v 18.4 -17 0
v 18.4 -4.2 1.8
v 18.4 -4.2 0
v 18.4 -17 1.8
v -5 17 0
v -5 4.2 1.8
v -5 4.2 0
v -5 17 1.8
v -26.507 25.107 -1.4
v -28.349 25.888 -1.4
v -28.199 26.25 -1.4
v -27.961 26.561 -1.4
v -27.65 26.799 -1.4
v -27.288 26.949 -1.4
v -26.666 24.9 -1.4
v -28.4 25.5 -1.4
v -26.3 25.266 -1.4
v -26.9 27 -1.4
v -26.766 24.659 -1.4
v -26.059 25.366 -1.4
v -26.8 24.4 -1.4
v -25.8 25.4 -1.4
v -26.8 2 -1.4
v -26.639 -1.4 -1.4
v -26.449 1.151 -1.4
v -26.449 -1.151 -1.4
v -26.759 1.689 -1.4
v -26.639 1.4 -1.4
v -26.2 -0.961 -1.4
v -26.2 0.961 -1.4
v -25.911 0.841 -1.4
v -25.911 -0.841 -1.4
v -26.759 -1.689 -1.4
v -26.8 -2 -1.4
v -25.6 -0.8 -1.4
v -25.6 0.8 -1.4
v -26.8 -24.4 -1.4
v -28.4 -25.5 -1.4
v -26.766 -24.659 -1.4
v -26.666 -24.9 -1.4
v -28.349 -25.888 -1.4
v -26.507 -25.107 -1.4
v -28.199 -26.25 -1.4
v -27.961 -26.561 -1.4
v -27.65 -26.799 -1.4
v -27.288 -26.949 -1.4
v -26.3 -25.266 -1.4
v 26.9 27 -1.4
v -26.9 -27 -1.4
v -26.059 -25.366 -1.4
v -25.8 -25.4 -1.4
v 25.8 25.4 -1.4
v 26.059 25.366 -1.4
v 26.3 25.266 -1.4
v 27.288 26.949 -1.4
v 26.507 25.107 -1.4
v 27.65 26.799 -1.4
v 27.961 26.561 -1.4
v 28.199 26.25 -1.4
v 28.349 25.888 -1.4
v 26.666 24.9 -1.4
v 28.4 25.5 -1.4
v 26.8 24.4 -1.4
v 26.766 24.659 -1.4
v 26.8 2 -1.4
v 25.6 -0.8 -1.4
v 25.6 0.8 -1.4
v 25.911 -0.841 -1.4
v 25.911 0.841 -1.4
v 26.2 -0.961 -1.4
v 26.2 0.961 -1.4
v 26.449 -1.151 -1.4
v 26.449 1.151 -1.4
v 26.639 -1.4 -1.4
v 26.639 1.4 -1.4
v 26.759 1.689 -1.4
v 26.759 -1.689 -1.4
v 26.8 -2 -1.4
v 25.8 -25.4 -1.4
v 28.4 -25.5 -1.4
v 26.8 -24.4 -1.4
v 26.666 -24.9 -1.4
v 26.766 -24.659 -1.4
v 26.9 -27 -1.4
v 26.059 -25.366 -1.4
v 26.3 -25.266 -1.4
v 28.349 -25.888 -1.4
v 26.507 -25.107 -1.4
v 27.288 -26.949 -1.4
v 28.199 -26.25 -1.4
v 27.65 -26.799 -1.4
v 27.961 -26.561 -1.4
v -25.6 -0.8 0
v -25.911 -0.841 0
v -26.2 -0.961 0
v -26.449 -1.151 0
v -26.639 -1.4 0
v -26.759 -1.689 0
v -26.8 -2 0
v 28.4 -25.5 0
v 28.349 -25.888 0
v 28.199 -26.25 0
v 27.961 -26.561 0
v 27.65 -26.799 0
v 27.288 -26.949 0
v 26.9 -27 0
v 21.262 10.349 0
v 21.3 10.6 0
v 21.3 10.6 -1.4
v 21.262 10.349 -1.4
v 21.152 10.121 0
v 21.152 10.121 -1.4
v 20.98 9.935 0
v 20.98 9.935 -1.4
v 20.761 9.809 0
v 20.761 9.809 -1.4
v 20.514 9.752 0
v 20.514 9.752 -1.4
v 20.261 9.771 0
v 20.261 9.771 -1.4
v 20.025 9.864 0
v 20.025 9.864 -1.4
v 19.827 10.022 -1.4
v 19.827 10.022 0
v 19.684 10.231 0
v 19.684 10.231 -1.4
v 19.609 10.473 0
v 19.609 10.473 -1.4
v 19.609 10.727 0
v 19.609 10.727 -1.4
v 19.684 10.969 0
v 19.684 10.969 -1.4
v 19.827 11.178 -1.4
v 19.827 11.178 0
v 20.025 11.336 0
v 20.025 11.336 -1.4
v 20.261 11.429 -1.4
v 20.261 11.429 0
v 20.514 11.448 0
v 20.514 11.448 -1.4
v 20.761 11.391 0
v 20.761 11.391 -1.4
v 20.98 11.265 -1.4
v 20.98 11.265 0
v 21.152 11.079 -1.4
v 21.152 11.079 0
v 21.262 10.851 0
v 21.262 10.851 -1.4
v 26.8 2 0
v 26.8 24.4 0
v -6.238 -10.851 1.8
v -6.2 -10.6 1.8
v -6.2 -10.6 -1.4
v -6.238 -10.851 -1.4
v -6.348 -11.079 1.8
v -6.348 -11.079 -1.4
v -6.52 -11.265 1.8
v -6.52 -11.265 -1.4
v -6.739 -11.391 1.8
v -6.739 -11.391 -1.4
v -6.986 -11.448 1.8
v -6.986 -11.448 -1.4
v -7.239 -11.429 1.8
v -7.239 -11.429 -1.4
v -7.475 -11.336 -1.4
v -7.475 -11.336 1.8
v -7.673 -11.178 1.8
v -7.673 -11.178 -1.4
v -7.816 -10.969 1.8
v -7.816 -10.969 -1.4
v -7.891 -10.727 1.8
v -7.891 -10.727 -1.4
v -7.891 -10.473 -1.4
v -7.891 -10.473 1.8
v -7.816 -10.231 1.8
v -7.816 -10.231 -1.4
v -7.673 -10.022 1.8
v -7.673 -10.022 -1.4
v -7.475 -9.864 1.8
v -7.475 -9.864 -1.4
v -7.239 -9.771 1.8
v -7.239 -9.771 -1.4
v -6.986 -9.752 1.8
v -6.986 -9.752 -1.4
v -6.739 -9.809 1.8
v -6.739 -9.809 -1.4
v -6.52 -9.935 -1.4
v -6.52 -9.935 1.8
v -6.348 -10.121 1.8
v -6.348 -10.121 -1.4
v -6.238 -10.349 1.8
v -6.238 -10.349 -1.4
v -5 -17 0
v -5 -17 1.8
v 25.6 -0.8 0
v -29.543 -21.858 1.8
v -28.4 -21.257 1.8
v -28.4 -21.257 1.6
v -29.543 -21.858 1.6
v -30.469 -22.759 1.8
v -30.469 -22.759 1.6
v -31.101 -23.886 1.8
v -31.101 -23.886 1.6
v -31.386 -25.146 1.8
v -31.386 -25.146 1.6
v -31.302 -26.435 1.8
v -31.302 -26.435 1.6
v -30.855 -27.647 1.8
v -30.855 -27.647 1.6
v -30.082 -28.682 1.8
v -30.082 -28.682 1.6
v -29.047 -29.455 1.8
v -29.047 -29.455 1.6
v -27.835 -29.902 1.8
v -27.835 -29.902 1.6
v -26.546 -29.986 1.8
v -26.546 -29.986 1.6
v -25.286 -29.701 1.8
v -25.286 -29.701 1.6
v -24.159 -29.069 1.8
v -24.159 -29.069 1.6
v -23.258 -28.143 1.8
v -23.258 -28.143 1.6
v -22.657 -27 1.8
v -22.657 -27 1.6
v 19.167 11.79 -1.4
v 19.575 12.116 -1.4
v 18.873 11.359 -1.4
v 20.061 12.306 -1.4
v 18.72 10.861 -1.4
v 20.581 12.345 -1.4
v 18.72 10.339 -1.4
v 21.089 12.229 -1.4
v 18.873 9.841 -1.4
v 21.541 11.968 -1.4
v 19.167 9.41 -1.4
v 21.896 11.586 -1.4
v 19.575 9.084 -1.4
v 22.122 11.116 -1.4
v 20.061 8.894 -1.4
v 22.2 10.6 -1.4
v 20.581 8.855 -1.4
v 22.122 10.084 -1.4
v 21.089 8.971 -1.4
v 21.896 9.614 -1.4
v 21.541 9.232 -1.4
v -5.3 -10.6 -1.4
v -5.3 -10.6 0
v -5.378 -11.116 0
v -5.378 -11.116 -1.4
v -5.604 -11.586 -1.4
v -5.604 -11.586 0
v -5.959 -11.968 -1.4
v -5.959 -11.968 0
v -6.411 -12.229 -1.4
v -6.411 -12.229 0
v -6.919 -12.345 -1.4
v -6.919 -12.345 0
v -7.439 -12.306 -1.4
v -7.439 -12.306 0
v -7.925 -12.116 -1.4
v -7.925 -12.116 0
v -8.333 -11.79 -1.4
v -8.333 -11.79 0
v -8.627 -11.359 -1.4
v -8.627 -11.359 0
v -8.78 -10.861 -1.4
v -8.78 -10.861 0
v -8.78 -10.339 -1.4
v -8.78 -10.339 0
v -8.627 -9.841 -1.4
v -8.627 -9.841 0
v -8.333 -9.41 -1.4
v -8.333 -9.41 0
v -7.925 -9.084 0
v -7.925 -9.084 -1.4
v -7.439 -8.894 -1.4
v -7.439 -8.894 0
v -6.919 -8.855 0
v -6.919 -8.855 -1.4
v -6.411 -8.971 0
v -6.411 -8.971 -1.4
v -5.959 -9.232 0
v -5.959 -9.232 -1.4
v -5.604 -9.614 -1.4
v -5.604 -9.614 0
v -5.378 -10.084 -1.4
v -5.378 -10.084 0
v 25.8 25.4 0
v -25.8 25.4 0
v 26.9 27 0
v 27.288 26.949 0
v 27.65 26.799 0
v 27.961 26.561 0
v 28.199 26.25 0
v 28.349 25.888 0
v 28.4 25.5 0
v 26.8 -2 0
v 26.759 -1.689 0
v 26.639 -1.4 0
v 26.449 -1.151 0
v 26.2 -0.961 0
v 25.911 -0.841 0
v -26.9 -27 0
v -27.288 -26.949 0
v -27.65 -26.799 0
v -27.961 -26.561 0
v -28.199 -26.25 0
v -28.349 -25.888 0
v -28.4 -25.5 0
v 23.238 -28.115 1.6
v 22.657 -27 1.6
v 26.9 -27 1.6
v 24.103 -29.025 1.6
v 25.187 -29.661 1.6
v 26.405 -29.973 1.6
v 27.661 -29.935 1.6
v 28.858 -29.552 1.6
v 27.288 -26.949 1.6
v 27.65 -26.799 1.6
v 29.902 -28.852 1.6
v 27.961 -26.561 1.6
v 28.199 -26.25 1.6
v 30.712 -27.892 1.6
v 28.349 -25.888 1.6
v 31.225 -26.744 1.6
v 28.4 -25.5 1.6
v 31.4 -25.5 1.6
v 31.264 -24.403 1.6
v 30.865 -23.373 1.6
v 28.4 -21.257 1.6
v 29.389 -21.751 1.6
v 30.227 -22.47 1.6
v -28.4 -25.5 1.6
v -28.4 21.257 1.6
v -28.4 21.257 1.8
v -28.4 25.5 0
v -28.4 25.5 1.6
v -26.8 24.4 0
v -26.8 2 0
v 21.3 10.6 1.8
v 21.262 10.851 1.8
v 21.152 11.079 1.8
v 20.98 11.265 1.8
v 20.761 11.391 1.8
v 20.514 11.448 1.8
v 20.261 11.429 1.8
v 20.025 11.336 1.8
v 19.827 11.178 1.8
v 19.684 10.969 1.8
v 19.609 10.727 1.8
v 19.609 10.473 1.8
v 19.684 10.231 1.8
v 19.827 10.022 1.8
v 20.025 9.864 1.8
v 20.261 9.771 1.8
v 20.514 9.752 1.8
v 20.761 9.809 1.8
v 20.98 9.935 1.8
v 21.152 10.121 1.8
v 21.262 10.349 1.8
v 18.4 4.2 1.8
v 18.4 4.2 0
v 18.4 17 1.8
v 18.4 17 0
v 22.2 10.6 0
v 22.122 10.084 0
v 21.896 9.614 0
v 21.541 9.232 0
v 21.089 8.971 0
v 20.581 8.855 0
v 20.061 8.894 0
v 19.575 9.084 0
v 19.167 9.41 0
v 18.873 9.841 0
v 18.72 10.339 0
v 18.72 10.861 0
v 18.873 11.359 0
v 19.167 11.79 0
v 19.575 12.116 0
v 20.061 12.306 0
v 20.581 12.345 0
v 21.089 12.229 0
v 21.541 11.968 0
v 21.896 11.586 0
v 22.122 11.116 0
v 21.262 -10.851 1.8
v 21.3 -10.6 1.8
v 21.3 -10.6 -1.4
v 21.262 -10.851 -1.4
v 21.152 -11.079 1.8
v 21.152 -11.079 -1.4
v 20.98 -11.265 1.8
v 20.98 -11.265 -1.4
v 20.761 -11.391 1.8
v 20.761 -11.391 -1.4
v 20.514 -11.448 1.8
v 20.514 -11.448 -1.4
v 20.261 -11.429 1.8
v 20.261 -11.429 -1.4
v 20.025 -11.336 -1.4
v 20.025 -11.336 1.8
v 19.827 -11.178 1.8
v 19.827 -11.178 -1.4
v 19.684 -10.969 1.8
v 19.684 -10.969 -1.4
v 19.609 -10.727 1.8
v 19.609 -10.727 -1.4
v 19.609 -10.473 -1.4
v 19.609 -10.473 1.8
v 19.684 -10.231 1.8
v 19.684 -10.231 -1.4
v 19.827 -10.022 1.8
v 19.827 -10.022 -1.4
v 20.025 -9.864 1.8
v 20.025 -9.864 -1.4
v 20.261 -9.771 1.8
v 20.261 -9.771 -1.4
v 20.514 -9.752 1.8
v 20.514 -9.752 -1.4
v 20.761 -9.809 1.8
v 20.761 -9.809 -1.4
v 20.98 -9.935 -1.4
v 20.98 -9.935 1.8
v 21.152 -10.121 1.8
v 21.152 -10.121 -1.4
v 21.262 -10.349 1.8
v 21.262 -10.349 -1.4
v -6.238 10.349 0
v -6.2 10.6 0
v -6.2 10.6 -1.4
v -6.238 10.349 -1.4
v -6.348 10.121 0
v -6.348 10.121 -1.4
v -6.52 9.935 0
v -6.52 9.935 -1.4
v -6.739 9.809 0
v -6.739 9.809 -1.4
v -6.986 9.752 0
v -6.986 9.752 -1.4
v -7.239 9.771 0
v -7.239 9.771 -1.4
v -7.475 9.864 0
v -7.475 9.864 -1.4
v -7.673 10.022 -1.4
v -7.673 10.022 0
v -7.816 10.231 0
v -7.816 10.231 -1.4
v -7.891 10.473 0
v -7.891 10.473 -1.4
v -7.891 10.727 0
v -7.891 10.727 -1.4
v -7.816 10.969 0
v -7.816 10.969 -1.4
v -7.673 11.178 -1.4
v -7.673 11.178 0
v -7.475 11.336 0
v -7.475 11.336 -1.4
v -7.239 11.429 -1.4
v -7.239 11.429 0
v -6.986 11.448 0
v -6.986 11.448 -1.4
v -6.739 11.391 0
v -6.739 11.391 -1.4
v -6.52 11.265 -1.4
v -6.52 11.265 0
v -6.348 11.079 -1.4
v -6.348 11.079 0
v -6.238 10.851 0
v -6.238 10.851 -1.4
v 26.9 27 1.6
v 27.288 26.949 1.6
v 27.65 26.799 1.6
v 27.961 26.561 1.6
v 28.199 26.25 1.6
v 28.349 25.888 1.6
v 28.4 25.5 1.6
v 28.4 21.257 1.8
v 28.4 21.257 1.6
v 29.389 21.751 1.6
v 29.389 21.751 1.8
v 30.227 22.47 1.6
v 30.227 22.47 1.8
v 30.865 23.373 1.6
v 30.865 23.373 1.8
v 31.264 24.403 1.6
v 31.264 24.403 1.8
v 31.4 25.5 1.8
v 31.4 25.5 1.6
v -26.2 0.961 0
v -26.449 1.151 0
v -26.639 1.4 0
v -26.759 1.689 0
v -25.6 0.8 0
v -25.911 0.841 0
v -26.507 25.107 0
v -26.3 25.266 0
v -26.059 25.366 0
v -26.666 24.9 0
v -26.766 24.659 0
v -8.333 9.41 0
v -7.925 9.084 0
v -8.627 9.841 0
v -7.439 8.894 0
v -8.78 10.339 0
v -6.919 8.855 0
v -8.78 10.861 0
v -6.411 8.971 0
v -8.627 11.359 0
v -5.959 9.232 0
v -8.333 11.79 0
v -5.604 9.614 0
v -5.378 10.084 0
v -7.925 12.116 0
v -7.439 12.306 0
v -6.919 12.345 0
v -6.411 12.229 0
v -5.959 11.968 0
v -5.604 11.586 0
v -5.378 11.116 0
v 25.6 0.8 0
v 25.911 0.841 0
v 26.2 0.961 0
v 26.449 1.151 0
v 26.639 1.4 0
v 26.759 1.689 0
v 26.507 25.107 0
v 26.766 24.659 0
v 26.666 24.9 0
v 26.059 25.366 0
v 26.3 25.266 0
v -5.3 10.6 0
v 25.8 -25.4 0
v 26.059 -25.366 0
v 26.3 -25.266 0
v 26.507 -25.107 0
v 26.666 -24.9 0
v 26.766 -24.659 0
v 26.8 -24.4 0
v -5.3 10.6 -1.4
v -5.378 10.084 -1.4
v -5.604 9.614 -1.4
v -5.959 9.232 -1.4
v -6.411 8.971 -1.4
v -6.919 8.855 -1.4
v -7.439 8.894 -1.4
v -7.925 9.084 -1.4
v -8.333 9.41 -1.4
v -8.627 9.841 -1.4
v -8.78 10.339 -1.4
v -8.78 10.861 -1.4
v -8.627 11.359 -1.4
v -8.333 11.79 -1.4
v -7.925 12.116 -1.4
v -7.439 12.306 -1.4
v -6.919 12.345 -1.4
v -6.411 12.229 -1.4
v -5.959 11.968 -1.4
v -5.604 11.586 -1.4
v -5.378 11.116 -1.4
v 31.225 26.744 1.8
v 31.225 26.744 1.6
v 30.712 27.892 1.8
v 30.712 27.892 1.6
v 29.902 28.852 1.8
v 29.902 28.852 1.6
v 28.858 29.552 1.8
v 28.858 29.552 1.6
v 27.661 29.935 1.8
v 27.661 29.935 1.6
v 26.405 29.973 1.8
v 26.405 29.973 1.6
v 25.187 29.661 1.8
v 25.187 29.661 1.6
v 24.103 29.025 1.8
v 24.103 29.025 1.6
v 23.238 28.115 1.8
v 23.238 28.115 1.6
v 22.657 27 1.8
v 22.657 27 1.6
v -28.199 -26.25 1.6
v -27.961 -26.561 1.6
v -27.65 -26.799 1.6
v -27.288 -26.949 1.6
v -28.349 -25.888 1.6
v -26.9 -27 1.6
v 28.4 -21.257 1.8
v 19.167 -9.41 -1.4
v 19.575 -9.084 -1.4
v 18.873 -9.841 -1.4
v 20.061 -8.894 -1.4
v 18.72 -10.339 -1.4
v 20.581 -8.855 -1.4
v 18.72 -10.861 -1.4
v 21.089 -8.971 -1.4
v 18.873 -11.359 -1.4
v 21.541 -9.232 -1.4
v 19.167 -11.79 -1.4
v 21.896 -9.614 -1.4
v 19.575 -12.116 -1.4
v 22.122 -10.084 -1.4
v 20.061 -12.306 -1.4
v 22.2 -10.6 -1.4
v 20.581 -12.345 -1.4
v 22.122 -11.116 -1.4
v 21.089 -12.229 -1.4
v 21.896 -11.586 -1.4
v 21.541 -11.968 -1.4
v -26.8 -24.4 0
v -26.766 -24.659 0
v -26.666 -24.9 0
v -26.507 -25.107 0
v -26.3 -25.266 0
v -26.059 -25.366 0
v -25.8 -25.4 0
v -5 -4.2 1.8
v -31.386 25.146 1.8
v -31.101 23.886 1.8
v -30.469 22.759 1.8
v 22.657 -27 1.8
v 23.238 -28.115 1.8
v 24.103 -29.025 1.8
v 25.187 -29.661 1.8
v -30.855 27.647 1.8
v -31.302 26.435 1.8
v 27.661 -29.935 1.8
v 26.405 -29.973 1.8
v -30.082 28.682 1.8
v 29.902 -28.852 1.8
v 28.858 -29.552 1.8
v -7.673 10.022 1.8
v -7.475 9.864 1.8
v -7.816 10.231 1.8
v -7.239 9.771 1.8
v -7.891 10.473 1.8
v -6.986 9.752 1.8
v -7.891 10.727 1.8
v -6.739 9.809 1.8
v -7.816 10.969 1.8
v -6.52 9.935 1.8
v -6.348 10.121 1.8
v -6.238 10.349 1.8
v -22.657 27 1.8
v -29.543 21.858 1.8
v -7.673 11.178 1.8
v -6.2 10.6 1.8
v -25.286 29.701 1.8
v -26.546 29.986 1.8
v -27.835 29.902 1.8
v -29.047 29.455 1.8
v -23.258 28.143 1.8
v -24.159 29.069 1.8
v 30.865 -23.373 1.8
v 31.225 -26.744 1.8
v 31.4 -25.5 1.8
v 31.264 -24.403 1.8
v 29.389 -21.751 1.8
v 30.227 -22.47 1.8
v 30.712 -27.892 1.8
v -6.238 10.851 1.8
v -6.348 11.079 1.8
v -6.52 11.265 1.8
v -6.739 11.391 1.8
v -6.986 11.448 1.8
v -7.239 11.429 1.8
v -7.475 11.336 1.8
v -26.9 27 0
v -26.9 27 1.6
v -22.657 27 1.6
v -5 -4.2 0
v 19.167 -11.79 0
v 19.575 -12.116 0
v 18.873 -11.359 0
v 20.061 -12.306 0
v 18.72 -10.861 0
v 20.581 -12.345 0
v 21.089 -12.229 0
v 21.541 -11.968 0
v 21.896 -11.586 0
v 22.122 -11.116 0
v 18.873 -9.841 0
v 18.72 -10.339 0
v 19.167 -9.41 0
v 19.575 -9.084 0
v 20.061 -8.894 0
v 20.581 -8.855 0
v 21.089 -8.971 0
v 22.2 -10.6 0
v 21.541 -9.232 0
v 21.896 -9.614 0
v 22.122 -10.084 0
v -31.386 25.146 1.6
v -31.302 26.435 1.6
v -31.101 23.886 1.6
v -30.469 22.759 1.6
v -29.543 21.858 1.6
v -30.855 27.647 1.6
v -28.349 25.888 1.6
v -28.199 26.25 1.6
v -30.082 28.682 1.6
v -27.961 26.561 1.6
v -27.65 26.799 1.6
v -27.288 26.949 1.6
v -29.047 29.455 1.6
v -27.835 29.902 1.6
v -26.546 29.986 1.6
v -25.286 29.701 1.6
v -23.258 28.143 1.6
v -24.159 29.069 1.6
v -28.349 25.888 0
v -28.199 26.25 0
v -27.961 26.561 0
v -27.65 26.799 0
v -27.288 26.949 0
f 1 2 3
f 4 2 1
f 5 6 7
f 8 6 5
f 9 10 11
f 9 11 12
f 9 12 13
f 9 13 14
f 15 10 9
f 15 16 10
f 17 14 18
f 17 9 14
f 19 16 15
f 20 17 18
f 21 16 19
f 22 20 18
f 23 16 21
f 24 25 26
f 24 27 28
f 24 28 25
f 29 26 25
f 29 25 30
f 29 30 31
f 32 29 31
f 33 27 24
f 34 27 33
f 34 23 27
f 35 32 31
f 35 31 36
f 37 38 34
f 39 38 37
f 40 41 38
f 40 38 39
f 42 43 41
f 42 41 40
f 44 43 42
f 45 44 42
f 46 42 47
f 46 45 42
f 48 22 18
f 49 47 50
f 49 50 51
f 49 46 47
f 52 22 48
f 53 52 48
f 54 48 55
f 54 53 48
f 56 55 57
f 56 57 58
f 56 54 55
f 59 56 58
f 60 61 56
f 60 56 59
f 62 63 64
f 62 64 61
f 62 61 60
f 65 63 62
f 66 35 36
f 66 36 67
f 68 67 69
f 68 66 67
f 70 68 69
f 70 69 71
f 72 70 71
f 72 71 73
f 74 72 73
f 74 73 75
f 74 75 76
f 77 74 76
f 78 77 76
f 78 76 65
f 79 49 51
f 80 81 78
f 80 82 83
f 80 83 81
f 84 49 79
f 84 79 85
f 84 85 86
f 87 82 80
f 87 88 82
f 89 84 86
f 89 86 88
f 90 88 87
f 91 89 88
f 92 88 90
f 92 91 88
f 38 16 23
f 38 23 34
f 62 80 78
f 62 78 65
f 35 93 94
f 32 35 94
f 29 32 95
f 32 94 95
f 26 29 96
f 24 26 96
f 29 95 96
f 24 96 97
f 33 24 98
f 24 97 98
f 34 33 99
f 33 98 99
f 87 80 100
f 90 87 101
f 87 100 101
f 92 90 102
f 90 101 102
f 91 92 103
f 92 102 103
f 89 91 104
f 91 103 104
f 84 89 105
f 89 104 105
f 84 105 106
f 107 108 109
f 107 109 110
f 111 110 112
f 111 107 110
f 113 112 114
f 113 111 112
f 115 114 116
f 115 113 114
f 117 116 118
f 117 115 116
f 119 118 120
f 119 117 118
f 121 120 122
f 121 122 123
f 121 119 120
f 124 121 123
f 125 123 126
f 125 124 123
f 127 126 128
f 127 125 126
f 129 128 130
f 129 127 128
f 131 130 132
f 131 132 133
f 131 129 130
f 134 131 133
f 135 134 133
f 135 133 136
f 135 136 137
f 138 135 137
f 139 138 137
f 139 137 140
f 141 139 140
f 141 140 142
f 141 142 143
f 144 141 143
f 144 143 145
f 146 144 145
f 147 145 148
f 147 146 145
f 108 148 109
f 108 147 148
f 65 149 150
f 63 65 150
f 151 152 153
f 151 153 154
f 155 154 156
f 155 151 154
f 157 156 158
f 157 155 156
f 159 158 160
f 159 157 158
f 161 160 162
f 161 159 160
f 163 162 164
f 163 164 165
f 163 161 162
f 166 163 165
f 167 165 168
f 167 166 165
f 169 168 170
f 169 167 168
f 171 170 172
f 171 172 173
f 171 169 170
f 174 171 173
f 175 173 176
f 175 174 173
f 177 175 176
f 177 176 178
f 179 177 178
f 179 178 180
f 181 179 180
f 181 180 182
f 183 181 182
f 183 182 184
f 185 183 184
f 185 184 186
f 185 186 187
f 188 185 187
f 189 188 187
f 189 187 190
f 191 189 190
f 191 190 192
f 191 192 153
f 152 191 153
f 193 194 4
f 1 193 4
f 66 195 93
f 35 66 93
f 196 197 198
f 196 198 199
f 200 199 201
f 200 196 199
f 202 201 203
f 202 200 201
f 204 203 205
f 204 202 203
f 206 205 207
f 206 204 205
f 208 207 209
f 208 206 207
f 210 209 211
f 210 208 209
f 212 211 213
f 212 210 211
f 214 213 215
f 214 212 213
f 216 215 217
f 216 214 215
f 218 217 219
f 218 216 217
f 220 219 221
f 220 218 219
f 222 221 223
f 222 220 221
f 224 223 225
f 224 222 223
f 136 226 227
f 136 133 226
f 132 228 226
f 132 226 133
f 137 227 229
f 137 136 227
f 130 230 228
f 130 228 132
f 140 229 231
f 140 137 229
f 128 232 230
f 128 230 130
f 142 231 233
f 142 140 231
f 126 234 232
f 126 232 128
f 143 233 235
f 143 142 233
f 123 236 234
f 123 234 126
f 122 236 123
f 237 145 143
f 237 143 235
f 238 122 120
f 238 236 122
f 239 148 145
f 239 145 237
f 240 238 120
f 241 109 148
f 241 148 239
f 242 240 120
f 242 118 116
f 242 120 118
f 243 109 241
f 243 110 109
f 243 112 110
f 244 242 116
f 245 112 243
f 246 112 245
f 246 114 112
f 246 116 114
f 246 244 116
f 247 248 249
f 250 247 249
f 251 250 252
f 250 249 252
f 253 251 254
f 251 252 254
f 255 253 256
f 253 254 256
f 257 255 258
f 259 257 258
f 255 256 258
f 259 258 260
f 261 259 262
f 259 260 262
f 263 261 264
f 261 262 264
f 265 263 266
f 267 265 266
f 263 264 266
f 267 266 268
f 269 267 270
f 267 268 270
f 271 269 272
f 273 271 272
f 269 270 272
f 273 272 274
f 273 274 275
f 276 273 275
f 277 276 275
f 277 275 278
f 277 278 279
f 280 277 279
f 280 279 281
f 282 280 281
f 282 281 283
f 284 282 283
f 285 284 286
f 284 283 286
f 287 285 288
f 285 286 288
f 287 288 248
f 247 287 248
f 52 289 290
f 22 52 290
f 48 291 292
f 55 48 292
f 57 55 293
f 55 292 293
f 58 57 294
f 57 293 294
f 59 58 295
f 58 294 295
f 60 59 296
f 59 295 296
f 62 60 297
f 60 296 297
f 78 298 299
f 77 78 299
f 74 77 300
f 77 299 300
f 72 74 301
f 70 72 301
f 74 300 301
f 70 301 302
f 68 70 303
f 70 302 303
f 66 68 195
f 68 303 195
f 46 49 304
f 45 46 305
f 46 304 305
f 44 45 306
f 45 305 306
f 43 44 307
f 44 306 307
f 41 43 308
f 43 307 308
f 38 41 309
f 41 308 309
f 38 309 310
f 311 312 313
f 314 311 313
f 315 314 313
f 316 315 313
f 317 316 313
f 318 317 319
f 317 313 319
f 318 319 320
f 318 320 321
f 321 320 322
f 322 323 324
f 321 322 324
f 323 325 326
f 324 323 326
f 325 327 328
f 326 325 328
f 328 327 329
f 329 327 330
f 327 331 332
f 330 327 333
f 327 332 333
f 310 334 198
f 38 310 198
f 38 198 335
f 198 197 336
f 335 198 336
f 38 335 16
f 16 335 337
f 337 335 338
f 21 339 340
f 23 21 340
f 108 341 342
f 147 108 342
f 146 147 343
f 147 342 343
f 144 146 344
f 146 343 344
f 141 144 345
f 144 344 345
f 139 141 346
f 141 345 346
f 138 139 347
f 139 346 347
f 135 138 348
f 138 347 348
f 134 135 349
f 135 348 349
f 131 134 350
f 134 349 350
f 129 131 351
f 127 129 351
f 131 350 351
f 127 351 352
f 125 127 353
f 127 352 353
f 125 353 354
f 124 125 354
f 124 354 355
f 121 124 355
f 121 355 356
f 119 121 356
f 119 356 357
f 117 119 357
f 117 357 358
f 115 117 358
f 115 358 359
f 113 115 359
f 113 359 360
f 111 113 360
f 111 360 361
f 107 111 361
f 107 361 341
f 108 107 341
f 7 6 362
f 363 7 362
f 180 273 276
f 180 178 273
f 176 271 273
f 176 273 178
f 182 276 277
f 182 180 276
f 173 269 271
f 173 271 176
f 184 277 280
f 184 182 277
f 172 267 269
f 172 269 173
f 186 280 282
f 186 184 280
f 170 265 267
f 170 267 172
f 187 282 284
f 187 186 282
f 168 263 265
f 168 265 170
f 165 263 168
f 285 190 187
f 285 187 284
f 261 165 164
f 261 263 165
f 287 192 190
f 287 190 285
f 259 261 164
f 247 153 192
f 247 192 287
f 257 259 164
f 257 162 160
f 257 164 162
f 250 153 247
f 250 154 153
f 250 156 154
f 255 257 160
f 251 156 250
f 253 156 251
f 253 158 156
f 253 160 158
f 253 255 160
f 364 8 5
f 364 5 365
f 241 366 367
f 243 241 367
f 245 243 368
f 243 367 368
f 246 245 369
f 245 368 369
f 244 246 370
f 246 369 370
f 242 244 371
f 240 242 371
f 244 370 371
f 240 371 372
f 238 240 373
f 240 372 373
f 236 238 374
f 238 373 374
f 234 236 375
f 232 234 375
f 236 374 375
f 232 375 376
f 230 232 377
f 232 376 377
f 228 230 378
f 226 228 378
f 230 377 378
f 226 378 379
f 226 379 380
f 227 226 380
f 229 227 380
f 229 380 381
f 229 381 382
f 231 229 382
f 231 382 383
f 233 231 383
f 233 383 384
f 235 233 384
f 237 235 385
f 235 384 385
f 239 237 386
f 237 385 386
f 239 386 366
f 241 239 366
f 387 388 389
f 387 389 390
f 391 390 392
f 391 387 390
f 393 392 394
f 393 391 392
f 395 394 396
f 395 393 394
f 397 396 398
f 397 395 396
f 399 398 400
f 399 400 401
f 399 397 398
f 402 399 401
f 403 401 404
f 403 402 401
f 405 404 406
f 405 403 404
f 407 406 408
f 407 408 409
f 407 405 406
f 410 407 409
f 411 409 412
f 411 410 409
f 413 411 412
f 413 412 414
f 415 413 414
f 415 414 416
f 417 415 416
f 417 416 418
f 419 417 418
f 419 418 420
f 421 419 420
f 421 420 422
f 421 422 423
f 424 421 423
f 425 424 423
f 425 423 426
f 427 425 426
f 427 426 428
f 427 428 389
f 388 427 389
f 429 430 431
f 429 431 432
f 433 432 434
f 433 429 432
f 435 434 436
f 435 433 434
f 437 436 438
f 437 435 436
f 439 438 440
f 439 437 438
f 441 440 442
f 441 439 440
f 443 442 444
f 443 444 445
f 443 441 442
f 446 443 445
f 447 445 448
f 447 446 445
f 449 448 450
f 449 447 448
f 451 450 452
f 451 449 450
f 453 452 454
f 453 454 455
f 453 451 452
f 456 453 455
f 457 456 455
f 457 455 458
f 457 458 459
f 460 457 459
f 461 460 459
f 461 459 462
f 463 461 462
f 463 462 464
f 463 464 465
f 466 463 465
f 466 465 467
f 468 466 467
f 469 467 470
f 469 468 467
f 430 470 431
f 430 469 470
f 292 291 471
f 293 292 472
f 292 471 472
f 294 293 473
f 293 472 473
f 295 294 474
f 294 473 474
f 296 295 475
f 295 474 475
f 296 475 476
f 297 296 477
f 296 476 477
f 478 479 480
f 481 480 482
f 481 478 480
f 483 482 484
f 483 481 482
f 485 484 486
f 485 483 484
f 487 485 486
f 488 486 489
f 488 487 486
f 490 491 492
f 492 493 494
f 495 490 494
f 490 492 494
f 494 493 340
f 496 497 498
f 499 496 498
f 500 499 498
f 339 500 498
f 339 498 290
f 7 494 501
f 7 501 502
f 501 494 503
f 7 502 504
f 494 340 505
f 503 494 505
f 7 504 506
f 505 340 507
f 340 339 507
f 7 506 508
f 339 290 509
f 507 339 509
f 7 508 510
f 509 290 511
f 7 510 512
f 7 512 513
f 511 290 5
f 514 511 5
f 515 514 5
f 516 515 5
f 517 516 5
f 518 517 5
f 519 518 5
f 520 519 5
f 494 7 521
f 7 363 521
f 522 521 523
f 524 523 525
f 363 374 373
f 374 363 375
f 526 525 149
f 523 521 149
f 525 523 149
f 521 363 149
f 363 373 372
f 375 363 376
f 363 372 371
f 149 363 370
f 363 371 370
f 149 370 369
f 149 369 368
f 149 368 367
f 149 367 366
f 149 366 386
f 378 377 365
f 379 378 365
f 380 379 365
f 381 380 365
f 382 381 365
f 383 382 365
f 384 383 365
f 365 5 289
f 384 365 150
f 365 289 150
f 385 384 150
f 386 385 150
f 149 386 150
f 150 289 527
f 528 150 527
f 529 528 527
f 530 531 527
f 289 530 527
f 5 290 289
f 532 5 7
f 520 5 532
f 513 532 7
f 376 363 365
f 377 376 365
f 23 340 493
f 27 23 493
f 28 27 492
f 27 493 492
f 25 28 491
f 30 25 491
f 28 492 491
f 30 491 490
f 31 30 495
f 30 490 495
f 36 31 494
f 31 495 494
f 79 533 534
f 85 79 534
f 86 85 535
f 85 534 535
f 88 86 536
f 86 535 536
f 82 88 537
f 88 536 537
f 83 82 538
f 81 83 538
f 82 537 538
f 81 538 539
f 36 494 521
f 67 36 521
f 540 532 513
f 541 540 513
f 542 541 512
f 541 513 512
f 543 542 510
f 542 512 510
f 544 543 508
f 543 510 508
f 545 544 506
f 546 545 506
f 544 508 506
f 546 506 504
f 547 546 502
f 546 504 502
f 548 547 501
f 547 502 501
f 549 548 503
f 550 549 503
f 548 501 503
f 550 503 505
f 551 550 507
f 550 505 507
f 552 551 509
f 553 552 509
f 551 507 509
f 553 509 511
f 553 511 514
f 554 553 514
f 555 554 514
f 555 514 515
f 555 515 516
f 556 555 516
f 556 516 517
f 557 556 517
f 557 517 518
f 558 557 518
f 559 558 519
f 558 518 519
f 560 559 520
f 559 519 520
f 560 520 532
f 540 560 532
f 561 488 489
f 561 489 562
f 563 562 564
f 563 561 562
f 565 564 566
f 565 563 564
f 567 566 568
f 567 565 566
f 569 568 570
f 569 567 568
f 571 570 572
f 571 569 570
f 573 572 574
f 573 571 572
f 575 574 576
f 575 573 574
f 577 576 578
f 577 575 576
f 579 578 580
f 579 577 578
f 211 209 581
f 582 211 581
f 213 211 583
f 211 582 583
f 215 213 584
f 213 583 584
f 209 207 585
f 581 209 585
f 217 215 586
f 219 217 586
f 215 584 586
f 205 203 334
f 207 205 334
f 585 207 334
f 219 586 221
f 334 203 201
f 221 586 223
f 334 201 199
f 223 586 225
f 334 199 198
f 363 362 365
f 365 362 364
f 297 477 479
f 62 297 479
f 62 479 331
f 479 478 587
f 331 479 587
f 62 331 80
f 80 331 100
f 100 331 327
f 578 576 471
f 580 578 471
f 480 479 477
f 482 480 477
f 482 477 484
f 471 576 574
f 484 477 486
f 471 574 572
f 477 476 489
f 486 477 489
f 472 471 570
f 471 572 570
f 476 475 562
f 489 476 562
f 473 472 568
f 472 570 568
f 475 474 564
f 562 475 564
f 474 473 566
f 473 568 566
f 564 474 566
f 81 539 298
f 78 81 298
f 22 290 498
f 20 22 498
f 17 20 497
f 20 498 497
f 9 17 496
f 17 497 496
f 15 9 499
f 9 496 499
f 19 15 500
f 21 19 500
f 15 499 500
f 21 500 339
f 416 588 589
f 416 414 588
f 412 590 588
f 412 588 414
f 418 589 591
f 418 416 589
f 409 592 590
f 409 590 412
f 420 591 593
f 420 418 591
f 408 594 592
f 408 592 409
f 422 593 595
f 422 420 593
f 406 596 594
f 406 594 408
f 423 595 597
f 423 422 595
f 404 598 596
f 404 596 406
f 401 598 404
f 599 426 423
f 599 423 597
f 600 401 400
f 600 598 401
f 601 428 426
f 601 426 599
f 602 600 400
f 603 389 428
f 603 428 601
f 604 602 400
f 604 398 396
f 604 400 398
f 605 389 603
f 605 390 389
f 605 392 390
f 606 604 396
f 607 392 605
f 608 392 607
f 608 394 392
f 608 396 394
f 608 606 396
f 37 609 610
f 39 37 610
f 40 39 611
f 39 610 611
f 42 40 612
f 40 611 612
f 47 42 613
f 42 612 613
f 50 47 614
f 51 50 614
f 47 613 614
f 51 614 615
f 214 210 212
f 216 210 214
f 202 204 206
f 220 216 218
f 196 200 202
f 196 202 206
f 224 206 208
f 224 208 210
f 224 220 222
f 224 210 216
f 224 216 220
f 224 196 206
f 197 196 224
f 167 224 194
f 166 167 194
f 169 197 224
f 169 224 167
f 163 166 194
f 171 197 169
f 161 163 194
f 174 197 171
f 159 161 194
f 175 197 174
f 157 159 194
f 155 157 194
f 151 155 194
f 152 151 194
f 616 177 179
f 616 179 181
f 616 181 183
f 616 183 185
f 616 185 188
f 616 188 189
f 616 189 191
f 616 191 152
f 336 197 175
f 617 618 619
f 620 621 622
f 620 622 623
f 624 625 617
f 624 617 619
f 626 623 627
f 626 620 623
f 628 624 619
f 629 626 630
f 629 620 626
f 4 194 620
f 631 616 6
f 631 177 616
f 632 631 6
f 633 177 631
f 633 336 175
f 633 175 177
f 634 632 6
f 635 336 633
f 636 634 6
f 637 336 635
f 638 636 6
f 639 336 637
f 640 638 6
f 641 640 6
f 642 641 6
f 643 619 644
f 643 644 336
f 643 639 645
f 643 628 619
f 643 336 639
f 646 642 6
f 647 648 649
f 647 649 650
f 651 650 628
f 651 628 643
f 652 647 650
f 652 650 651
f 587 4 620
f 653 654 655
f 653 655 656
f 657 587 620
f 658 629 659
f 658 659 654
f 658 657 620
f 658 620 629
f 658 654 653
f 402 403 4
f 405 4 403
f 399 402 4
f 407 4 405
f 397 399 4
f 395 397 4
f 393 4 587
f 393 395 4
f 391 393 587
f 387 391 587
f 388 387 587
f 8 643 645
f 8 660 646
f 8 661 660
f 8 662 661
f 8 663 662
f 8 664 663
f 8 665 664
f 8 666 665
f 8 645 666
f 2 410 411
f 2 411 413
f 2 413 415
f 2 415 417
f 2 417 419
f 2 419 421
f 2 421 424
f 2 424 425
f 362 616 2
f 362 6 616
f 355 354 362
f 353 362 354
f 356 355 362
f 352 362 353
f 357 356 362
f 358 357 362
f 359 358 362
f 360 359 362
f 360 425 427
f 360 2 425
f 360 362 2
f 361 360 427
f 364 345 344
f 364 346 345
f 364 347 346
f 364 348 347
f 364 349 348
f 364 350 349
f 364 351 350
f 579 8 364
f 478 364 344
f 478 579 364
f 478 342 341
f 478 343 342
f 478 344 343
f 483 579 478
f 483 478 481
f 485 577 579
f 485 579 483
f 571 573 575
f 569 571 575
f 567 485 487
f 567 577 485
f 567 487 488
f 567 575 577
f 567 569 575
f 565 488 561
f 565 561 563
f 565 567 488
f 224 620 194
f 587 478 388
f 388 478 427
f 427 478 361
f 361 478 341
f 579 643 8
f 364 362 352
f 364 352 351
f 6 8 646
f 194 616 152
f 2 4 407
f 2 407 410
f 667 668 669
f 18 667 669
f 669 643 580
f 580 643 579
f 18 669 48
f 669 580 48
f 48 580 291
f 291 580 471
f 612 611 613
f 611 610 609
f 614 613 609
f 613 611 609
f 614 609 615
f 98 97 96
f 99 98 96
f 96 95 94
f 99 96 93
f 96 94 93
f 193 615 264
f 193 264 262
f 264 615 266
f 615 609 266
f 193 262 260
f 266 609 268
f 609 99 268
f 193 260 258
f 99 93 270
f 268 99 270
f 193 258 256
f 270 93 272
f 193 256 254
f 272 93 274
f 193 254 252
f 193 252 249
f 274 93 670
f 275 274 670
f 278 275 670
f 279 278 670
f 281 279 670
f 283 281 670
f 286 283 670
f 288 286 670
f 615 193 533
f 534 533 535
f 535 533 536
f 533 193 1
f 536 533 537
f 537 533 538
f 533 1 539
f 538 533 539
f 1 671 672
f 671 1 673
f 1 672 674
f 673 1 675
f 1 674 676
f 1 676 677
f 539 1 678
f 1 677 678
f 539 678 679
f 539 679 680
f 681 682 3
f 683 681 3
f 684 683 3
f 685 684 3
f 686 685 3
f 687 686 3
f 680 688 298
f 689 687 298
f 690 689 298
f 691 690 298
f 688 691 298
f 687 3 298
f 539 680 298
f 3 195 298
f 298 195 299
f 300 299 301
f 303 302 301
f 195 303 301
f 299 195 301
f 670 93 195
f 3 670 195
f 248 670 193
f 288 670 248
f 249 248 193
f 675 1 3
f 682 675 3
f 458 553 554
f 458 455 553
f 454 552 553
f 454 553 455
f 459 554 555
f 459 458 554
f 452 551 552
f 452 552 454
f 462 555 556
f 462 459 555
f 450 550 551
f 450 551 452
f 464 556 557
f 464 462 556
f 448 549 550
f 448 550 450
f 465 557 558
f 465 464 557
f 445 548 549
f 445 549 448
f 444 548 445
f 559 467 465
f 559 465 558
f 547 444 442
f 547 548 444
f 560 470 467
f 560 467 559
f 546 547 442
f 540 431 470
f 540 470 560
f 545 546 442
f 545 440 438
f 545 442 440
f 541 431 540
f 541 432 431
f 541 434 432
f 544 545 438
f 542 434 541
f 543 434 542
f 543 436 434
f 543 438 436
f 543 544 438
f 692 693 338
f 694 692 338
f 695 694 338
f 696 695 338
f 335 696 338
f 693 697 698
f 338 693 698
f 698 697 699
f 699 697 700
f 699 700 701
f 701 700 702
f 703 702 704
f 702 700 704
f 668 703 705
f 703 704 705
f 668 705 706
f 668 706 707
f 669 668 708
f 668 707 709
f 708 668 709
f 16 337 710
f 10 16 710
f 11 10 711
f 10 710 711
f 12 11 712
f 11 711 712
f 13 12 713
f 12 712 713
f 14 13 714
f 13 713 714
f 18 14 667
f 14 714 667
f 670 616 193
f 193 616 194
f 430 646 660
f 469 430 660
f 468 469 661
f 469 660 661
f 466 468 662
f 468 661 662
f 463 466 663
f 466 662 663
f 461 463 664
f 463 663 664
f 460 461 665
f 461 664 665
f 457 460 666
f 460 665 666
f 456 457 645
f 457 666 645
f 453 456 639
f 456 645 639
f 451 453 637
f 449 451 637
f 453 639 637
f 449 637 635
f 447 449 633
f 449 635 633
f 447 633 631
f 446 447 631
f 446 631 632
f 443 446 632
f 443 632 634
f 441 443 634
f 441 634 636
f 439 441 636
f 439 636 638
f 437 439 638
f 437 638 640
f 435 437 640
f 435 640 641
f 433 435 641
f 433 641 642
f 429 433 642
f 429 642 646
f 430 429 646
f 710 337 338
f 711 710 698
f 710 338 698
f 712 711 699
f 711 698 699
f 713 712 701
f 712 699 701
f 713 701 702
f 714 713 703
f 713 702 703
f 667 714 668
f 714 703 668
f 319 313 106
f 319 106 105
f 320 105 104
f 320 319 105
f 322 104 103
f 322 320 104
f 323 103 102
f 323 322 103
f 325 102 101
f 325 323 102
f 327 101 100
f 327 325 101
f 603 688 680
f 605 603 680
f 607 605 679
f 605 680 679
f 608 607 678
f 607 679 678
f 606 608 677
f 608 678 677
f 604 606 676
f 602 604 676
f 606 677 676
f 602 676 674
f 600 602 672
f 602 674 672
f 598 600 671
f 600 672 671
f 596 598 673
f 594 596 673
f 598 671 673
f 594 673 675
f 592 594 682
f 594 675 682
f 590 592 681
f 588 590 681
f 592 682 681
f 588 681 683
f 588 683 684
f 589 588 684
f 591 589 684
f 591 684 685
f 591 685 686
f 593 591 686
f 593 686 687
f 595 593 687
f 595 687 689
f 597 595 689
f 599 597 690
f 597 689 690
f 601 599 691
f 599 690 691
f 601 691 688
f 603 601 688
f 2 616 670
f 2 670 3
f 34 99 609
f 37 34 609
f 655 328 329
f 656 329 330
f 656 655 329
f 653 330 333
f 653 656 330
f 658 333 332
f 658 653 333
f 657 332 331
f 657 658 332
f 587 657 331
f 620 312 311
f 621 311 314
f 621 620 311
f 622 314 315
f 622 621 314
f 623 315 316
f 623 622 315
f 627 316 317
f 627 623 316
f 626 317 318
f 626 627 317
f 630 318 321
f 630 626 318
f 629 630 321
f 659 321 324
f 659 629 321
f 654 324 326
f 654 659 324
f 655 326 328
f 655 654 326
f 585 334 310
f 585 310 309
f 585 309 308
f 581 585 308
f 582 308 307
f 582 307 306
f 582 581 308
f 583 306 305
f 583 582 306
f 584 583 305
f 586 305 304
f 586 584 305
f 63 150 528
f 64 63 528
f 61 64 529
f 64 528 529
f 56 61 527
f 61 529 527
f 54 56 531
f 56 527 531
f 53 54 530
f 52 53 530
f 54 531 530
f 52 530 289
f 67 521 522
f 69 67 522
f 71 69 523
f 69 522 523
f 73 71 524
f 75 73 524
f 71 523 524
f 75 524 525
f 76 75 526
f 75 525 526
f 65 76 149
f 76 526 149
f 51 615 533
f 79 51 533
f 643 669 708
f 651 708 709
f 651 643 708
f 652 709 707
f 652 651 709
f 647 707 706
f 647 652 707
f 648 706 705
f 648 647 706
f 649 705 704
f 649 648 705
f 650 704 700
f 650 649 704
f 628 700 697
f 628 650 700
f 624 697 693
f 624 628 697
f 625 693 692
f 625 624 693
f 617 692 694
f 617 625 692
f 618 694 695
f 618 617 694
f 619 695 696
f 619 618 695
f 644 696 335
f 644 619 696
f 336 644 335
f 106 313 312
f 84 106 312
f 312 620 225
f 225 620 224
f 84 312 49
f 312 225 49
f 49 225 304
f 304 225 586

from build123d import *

# Parameters (mm, degrees)
F0_W     = 56.8
F0_H     = 54
F1_DEPTH = 1.8
F2_W     = 23.4
F2_H     = 12.8
F2_R     = 0.85
F3_DEPTH = 1.801
F4_R     = 1.5
F5_R     = 1.75
F5_R_2   = 0.85
F6_DEPTH = 1.4
F7_R     = 4.5
F8_DEPTH = 0.2


# Not quite as in the source:
# - a pattern or mirror of a feature is missing from the dataset's text; its kind, count and spacing are read off the source's solid


with BuildPart() as f1:
    # F0 (on Top) → F1 (new body)
    with BuildSketch(Plane.XY):
        Rectangle(F0_W, F0_H)
    extrude(amount=F1_DEPTH)

    # F2 (on face) → F3 (cut, through all)
    with BuildSketch(Plane.XY.offset(1.8)):
        with Locations((6.7, 10.6)):
            Rectangle(F2_W, F2_H)
        with Locations((-7.05, 10.6)):
            Circle(F2_R)
        with Locations((20.45, 10.6)):
            Circle(F2_R)
    f3 = extrude(amount=-F3_DEPTH, mode=Mode.SUBTRACT)

    # F3_copies: F3 across plane
    add(f3.mirror(Plane(origin=(0, 0, 0), x_dir=(0, 0, -1), z_dir=(0, -1, 0))), mode=Mode.SUBTRACT)

    # F4
    f4_edges = [f1.edges().sort_by_distance(p)[0] for p in [
        (28.4, 27, 0.9),
        (28.4, -27, 0.9),
        (-28.4, -27, 0.9),
        (-28.4, 27, 0.9),
    ]]
    fillet(f4_edges, radius=F4_R)

    # F5 (on face) → F6 (join)
    with BuildSketch(Plane(origin=(0, 0, 0), x_dir=(1, 0, 0), z_dir=(0, 0, -1))):
        with BuildLine():
            Line((-28.4, 25.5), (-28.4, -25.5))
            ThreePointArc((-28.4, -25.5), (-27.9606601718, -26.5606601718), (-26.9, -27))
            Line((-26.9, -27), (26.9, -27))
            ThreePointArc((26.9, -27), (27.9606601718, -26.5606601718), (28.4, -25.5))
            Line((28.4, -25.5), (28.4, 25.5))
            ThreePointArc((28.4, 25.5), (27.9606601718, 26.5606601718), (26.9, 27))
            Line((26.9, 27), (-26.9, 27))
            ThreePointArc((-26.9, 27), (-27.9606601718, 26.5606601718), (-28.4, 25.5))
        make_face()
        with BuildLine():
            Line((26.8, -2), (26.8, -24.4))
            ThreePointArc((26.8, -24.4), (26.5071067812, -25.1071067812), (25.8, -25.4))
            Line((25.8, -25.4), (-25.8, -25.4))
            ThreePointArc((-25.8, -25.4), (-26.5071067812, -25.1071067812), (-26.8, -24.4))
            Line((-26.8, -24.4), (-26.8, -2))
            Line((-26.8, -2), (-26.8, 2))
            Line((-26.8, 2), (-26.8, 24.4))
            ThreePointArc((-26.8, 24.4), (-26.5071067812, 25.1071067812), (-25.8, 25.4))
            Line((-25.8, 25.4), (25.8, 25.4))
            ThreePointArc((25.8, 25.4), (26.5071067812, 25.1071067812), (26.8, 24.4))
            Line((26.8, 24.4), (26.8, 2))
            Line((26.8, 2), (26.8, -2))
        make_face(mode=Mode.SUBTRACT)
        with Locations((-7.05, 10.6)):
            Circle(F5_R)
        with Locations((-7.05, 10.6)):
            Circle(F5_R_2, mode=Mode.SUBTRACT)
        with Locations((-7.05, -10.6)):
            Circle(F5_R)
        with Locations((-7.05, -10.6)):
            Circle(F5_R_2, mode=Mode.SUBTRACT)
        with Locations((20.45, 10.6)):
            Circle(F5_R)
        with Locations((20.45, 10.6)):
            Circle(F5_R_2, mode=Mode.SUBTRACT)
        with Locations((20.45, -10.6)):
            Circle(F5_R)
        with Locations((20.45, -10.6)):
            Circle(F5_R_2, mode=Mode.SUBTRACT)
        with BuildLine():
            ThreePointArc((25.6, -0.8), (26.4485281374, -1.1514718626), (26.8, -2))
            Line((26.8, -2), (26.8, 2))
            ThreePointArc((26.8, 2), (26.4485281374, 1.1514718626), (25.6, 0.8))
            Line((25.6, 0.8), (-25.6, 0.8))
            ThreePointArc((-25.6, 0.8), (-26.4485281374, 1.1514718626), (-26.8, 2))
            Line((-26.8, 2), (-26.8, -2))
            ThreePointArc((-26.8, -2), (-26.4485281374, -1.1514718626), (-25.6, -0.8))
            Line((-25.6, -0.8), (25.6, -0.8))
        make_face()
    extrude(amount=F6_DEPTH)

    # F7 (on face) → F8 (join)
    with BuildSketch(Plane.XY.offset(1.8)):
        with Locations((-26.9, 25.5)):
            Circle(F7_R)
        with Locations((-26.9, -25.5)):
            Circle(F7_R)
        with Locations((26.9, -25.5)):
            Circle(F7_R)
        with Locations((26.9, 25.5)):
            Circle(F7_R)
    extrude(amount=-F8_DEPTH)


solid = f1.part
